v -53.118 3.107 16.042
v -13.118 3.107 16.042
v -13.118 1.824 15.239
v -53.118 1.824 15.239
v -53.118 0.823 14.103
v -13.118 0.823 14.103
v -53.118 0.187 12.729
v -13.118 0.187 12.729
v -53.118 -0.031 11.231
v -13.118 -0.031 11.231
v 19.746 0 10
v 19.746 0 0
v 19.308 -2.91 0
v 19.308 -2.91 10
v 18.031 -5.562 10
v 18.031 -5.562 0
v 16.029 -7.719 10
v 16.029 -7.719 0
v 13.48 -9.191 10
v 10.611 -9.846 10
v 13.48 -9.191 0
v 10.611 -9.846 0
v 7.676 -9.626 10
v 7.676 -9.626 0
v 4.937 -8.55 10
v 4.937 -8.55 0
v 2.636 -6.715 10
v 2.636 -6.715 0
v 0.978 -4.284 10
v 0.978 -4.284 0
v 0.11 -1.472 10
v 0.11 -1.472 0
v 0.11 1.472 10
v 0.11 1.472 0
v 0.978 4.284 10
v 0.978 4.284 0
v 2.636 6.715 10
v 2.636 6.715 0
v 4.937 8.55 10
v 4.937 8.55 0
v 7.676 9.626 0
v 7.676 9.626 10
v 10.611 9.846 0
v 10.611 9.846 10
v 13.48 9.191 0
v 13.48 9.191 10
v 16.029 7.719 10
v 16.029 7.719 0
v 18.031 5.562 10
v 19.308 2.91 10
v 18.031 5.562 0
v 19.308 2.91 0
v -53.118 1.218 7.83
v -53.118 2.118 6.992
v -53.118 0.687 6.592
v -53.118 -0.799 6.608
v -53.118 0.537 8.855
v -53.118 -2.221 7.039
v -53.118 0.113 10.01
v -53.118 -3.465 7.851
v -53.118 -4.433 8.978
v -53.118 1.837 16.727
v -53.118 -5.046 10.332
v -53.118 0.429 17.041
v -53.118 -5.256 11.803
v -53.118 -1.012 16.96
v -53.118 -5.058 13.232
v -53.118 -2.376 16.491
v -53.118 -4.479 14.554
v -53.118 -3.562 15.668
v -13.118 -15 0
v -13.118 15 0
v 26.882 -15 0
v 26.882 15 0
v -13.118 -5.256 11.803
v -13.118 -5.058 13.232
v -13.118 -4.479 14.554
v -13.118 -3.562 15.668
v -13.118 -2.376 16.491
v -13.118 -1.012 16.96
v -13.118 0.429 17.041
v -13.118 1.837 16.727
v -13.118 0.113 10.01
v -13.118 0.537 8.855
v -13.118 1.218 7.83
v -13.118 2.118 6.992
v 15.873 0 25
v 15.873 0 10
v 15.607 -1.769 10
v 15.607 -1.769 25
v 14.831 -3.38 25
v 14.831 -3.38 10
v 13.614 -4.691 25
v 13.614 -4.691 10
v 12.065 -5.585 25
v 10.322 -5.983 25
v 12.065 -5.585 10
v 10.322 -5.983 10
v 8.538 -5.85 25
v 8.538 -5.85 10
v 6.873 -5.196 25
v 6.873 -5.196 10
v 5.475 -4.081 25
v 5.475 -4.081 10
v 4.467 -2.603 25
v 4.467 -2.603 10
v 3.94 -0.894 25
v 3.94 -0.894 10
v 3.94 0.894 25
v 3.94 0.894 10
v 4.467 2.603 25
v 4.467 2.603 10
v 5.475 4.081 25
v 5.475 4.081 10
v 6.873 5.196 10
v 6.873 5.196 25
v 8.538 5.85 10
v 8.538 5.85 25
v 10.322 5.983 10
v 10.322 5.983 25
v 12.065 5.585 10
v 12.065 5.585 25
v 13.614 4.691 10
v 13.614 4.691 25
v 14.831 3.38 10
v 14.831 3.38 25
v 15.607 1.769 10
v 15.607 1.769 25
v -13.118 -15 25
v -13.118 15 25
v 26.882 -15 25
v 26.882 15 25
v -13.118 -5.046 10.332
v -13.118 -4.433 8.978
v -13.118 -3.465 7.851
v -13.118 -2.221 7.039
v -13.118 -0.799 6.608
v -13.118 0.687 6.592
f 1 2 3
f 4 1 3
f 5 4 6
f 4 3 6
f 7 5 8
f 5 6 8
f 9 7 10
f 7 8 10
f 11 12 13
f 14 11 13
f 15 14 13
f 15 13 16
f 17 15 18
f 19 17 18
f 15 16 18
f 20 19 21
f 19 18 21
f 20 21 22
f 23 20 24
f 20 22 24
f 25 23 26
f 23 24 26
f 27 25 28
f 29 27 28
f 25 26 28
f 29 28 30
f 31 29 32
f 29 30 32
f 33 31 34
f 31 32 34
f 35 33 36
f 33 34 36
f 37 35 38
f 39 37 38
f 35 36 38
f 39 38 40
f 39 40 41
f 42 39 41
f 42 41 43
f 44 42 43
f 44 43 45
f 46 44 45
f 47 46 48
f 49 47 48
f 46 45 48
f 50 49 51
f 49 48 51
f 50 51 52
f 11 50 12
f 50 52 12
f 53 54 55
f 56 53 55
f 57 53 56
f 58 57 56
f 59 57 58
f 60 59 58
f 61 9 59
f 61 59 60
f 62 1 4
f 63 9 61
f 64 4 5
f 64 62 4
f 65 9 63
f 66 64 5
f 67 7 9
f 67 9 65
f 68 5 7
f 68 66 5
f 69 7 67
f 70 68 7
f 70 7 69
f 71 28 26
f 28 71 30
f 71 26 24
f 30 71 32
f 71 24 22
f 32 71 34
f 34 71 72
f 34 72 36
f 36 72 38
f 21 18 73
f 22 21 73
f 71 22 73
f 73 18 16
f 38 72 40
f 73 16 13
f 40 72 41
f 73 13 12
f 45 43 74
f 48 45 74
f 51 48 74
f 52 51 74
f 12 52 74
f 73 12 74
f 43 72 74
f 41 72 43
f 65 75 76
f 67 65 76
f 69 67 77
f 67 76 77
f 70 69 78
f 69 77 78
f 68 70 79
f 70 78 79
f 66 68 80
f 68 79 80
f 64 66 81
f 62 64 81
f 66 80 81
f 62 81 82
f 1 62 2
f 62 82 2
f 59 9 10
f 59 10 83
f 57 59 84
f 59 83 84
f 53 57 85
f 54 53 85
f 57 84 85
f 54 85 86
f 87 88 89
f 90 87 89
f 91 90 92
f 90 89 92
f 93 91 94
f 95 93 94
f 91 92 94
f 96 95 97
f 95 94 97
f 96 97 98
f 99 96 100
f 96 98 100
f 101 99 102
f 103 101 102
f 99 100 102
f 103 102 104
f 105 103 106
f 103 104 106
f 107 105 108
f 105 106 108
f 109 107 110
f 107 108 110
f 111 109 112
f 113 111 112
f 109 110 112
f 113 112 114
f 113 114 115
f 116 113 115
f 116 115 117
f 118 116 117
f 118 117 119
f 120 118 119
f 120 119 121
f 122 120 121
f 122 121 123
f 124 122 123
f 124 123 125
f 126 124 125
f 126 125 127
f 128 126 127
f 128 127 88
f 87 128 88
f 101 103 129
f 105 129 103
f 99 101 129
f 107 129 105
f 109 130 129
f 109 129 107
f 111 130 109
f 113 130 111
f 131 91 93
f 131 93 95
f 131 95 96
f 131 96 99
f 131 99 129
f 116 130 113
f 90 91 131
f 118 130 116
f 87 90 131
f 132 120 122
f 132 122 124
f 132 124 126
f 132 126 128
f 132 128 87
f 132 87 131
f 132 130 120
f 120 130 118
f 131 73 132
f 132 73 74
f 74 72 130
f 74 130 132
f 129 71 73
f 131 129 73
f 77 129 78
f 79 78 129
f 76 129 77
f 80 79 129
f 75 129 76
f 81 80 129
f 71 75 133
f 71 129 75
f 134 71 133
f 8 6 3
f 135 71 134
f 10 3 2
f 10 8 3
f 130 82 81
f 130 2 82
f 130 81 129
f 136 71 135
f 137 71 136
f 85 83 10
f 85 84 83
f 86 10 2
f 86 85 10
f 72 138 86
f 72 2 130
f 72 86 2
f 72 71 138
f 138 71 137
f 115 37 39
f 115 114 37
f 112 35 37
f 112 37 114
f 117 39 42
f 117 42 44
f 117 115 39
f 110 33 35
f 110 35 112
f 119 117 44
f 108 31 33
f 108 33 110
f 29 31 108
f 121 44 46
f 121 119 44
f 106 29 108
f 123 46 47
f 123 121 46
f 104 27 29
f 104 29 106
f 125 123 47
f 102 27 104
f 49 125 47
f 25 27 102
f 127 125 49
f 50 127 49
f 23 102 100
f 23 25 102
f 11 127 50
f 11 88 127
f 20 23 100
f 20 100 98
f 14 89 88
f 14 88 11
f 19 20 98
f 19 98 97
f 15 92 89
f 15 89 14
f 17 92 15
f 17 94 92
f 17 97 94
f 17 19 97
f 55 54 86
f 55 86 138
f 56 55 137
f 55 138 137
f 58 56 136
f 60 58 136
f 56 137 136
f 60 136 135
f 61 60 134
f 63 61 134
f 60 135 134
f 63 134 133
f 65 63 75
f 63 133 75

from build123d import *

# Parameters (mm, degrees)
F0_W     = 40
F0_H     = 30
F1_DEPTH = 25
F2_R     = 9.873161
F3_DEPTH = 10
F4_R     = 6
F5_DEPTH = 25
F7_DEPTH = 40


with BuildPart() as f1:
    # F0 (on Top) → F1 (new body)
    with BuildSketch(Plane.XY):
        with Locations((6.881981, 0)):
            Rectangle(F0_W, F0_H)
    extrude(amount=F1_DEPTH)

    # F2 (on face) → F3 (cut)
    with BuildSketch(Plane(origin=(0, 0, 0), x_dir=(1, 0, 0), z_dir=(0, 0, -1))):
        with Locations((9.873161, 0)):
            Circle(F2_R)
    extrude(amount=-F3_DEPTH, mode=Mode.SUBTRACT)

    # F4 (on face) → F5 (cut)
    with BuildSketch(Plane(origin=(0, 0, 10), x_dir=(1, 0, 0), z_dir=(0, 0, -1))):
        with Locations((9.873161, 0)):
            Circle(F4_R)
    extrude(amount=-F5_DEPTH, mode=Mode.SUBTRACT)

    # F6 (on face) → F7 (join)
    with BuildSketch(Plane(origin=(-13.118019, 0, 0), x_dir=(0, -1, 0), z_dir=(-1, 0, 0))):
        with BuildLine():
            ThreePointArc((-2.117814, 6.992008), (2.871889, 7.40042), (5.256141, 11.802609))
            ThreePointArc((5.256141, 11.802609), (2.376464, 16.490832), (-3.107196, 16.04199))
            ThreePointArc((-3.107196, 16.04199), (-0.82282, 14.103278), (0.031131, 11.231389))
            ThreePointArc((0.031131, 11.231389), (-0.536786, 8.854926), (-2.117814, 6.992008))
        make_face()
    extrude(amount=F7_DEPTH)


solid = f1.part
